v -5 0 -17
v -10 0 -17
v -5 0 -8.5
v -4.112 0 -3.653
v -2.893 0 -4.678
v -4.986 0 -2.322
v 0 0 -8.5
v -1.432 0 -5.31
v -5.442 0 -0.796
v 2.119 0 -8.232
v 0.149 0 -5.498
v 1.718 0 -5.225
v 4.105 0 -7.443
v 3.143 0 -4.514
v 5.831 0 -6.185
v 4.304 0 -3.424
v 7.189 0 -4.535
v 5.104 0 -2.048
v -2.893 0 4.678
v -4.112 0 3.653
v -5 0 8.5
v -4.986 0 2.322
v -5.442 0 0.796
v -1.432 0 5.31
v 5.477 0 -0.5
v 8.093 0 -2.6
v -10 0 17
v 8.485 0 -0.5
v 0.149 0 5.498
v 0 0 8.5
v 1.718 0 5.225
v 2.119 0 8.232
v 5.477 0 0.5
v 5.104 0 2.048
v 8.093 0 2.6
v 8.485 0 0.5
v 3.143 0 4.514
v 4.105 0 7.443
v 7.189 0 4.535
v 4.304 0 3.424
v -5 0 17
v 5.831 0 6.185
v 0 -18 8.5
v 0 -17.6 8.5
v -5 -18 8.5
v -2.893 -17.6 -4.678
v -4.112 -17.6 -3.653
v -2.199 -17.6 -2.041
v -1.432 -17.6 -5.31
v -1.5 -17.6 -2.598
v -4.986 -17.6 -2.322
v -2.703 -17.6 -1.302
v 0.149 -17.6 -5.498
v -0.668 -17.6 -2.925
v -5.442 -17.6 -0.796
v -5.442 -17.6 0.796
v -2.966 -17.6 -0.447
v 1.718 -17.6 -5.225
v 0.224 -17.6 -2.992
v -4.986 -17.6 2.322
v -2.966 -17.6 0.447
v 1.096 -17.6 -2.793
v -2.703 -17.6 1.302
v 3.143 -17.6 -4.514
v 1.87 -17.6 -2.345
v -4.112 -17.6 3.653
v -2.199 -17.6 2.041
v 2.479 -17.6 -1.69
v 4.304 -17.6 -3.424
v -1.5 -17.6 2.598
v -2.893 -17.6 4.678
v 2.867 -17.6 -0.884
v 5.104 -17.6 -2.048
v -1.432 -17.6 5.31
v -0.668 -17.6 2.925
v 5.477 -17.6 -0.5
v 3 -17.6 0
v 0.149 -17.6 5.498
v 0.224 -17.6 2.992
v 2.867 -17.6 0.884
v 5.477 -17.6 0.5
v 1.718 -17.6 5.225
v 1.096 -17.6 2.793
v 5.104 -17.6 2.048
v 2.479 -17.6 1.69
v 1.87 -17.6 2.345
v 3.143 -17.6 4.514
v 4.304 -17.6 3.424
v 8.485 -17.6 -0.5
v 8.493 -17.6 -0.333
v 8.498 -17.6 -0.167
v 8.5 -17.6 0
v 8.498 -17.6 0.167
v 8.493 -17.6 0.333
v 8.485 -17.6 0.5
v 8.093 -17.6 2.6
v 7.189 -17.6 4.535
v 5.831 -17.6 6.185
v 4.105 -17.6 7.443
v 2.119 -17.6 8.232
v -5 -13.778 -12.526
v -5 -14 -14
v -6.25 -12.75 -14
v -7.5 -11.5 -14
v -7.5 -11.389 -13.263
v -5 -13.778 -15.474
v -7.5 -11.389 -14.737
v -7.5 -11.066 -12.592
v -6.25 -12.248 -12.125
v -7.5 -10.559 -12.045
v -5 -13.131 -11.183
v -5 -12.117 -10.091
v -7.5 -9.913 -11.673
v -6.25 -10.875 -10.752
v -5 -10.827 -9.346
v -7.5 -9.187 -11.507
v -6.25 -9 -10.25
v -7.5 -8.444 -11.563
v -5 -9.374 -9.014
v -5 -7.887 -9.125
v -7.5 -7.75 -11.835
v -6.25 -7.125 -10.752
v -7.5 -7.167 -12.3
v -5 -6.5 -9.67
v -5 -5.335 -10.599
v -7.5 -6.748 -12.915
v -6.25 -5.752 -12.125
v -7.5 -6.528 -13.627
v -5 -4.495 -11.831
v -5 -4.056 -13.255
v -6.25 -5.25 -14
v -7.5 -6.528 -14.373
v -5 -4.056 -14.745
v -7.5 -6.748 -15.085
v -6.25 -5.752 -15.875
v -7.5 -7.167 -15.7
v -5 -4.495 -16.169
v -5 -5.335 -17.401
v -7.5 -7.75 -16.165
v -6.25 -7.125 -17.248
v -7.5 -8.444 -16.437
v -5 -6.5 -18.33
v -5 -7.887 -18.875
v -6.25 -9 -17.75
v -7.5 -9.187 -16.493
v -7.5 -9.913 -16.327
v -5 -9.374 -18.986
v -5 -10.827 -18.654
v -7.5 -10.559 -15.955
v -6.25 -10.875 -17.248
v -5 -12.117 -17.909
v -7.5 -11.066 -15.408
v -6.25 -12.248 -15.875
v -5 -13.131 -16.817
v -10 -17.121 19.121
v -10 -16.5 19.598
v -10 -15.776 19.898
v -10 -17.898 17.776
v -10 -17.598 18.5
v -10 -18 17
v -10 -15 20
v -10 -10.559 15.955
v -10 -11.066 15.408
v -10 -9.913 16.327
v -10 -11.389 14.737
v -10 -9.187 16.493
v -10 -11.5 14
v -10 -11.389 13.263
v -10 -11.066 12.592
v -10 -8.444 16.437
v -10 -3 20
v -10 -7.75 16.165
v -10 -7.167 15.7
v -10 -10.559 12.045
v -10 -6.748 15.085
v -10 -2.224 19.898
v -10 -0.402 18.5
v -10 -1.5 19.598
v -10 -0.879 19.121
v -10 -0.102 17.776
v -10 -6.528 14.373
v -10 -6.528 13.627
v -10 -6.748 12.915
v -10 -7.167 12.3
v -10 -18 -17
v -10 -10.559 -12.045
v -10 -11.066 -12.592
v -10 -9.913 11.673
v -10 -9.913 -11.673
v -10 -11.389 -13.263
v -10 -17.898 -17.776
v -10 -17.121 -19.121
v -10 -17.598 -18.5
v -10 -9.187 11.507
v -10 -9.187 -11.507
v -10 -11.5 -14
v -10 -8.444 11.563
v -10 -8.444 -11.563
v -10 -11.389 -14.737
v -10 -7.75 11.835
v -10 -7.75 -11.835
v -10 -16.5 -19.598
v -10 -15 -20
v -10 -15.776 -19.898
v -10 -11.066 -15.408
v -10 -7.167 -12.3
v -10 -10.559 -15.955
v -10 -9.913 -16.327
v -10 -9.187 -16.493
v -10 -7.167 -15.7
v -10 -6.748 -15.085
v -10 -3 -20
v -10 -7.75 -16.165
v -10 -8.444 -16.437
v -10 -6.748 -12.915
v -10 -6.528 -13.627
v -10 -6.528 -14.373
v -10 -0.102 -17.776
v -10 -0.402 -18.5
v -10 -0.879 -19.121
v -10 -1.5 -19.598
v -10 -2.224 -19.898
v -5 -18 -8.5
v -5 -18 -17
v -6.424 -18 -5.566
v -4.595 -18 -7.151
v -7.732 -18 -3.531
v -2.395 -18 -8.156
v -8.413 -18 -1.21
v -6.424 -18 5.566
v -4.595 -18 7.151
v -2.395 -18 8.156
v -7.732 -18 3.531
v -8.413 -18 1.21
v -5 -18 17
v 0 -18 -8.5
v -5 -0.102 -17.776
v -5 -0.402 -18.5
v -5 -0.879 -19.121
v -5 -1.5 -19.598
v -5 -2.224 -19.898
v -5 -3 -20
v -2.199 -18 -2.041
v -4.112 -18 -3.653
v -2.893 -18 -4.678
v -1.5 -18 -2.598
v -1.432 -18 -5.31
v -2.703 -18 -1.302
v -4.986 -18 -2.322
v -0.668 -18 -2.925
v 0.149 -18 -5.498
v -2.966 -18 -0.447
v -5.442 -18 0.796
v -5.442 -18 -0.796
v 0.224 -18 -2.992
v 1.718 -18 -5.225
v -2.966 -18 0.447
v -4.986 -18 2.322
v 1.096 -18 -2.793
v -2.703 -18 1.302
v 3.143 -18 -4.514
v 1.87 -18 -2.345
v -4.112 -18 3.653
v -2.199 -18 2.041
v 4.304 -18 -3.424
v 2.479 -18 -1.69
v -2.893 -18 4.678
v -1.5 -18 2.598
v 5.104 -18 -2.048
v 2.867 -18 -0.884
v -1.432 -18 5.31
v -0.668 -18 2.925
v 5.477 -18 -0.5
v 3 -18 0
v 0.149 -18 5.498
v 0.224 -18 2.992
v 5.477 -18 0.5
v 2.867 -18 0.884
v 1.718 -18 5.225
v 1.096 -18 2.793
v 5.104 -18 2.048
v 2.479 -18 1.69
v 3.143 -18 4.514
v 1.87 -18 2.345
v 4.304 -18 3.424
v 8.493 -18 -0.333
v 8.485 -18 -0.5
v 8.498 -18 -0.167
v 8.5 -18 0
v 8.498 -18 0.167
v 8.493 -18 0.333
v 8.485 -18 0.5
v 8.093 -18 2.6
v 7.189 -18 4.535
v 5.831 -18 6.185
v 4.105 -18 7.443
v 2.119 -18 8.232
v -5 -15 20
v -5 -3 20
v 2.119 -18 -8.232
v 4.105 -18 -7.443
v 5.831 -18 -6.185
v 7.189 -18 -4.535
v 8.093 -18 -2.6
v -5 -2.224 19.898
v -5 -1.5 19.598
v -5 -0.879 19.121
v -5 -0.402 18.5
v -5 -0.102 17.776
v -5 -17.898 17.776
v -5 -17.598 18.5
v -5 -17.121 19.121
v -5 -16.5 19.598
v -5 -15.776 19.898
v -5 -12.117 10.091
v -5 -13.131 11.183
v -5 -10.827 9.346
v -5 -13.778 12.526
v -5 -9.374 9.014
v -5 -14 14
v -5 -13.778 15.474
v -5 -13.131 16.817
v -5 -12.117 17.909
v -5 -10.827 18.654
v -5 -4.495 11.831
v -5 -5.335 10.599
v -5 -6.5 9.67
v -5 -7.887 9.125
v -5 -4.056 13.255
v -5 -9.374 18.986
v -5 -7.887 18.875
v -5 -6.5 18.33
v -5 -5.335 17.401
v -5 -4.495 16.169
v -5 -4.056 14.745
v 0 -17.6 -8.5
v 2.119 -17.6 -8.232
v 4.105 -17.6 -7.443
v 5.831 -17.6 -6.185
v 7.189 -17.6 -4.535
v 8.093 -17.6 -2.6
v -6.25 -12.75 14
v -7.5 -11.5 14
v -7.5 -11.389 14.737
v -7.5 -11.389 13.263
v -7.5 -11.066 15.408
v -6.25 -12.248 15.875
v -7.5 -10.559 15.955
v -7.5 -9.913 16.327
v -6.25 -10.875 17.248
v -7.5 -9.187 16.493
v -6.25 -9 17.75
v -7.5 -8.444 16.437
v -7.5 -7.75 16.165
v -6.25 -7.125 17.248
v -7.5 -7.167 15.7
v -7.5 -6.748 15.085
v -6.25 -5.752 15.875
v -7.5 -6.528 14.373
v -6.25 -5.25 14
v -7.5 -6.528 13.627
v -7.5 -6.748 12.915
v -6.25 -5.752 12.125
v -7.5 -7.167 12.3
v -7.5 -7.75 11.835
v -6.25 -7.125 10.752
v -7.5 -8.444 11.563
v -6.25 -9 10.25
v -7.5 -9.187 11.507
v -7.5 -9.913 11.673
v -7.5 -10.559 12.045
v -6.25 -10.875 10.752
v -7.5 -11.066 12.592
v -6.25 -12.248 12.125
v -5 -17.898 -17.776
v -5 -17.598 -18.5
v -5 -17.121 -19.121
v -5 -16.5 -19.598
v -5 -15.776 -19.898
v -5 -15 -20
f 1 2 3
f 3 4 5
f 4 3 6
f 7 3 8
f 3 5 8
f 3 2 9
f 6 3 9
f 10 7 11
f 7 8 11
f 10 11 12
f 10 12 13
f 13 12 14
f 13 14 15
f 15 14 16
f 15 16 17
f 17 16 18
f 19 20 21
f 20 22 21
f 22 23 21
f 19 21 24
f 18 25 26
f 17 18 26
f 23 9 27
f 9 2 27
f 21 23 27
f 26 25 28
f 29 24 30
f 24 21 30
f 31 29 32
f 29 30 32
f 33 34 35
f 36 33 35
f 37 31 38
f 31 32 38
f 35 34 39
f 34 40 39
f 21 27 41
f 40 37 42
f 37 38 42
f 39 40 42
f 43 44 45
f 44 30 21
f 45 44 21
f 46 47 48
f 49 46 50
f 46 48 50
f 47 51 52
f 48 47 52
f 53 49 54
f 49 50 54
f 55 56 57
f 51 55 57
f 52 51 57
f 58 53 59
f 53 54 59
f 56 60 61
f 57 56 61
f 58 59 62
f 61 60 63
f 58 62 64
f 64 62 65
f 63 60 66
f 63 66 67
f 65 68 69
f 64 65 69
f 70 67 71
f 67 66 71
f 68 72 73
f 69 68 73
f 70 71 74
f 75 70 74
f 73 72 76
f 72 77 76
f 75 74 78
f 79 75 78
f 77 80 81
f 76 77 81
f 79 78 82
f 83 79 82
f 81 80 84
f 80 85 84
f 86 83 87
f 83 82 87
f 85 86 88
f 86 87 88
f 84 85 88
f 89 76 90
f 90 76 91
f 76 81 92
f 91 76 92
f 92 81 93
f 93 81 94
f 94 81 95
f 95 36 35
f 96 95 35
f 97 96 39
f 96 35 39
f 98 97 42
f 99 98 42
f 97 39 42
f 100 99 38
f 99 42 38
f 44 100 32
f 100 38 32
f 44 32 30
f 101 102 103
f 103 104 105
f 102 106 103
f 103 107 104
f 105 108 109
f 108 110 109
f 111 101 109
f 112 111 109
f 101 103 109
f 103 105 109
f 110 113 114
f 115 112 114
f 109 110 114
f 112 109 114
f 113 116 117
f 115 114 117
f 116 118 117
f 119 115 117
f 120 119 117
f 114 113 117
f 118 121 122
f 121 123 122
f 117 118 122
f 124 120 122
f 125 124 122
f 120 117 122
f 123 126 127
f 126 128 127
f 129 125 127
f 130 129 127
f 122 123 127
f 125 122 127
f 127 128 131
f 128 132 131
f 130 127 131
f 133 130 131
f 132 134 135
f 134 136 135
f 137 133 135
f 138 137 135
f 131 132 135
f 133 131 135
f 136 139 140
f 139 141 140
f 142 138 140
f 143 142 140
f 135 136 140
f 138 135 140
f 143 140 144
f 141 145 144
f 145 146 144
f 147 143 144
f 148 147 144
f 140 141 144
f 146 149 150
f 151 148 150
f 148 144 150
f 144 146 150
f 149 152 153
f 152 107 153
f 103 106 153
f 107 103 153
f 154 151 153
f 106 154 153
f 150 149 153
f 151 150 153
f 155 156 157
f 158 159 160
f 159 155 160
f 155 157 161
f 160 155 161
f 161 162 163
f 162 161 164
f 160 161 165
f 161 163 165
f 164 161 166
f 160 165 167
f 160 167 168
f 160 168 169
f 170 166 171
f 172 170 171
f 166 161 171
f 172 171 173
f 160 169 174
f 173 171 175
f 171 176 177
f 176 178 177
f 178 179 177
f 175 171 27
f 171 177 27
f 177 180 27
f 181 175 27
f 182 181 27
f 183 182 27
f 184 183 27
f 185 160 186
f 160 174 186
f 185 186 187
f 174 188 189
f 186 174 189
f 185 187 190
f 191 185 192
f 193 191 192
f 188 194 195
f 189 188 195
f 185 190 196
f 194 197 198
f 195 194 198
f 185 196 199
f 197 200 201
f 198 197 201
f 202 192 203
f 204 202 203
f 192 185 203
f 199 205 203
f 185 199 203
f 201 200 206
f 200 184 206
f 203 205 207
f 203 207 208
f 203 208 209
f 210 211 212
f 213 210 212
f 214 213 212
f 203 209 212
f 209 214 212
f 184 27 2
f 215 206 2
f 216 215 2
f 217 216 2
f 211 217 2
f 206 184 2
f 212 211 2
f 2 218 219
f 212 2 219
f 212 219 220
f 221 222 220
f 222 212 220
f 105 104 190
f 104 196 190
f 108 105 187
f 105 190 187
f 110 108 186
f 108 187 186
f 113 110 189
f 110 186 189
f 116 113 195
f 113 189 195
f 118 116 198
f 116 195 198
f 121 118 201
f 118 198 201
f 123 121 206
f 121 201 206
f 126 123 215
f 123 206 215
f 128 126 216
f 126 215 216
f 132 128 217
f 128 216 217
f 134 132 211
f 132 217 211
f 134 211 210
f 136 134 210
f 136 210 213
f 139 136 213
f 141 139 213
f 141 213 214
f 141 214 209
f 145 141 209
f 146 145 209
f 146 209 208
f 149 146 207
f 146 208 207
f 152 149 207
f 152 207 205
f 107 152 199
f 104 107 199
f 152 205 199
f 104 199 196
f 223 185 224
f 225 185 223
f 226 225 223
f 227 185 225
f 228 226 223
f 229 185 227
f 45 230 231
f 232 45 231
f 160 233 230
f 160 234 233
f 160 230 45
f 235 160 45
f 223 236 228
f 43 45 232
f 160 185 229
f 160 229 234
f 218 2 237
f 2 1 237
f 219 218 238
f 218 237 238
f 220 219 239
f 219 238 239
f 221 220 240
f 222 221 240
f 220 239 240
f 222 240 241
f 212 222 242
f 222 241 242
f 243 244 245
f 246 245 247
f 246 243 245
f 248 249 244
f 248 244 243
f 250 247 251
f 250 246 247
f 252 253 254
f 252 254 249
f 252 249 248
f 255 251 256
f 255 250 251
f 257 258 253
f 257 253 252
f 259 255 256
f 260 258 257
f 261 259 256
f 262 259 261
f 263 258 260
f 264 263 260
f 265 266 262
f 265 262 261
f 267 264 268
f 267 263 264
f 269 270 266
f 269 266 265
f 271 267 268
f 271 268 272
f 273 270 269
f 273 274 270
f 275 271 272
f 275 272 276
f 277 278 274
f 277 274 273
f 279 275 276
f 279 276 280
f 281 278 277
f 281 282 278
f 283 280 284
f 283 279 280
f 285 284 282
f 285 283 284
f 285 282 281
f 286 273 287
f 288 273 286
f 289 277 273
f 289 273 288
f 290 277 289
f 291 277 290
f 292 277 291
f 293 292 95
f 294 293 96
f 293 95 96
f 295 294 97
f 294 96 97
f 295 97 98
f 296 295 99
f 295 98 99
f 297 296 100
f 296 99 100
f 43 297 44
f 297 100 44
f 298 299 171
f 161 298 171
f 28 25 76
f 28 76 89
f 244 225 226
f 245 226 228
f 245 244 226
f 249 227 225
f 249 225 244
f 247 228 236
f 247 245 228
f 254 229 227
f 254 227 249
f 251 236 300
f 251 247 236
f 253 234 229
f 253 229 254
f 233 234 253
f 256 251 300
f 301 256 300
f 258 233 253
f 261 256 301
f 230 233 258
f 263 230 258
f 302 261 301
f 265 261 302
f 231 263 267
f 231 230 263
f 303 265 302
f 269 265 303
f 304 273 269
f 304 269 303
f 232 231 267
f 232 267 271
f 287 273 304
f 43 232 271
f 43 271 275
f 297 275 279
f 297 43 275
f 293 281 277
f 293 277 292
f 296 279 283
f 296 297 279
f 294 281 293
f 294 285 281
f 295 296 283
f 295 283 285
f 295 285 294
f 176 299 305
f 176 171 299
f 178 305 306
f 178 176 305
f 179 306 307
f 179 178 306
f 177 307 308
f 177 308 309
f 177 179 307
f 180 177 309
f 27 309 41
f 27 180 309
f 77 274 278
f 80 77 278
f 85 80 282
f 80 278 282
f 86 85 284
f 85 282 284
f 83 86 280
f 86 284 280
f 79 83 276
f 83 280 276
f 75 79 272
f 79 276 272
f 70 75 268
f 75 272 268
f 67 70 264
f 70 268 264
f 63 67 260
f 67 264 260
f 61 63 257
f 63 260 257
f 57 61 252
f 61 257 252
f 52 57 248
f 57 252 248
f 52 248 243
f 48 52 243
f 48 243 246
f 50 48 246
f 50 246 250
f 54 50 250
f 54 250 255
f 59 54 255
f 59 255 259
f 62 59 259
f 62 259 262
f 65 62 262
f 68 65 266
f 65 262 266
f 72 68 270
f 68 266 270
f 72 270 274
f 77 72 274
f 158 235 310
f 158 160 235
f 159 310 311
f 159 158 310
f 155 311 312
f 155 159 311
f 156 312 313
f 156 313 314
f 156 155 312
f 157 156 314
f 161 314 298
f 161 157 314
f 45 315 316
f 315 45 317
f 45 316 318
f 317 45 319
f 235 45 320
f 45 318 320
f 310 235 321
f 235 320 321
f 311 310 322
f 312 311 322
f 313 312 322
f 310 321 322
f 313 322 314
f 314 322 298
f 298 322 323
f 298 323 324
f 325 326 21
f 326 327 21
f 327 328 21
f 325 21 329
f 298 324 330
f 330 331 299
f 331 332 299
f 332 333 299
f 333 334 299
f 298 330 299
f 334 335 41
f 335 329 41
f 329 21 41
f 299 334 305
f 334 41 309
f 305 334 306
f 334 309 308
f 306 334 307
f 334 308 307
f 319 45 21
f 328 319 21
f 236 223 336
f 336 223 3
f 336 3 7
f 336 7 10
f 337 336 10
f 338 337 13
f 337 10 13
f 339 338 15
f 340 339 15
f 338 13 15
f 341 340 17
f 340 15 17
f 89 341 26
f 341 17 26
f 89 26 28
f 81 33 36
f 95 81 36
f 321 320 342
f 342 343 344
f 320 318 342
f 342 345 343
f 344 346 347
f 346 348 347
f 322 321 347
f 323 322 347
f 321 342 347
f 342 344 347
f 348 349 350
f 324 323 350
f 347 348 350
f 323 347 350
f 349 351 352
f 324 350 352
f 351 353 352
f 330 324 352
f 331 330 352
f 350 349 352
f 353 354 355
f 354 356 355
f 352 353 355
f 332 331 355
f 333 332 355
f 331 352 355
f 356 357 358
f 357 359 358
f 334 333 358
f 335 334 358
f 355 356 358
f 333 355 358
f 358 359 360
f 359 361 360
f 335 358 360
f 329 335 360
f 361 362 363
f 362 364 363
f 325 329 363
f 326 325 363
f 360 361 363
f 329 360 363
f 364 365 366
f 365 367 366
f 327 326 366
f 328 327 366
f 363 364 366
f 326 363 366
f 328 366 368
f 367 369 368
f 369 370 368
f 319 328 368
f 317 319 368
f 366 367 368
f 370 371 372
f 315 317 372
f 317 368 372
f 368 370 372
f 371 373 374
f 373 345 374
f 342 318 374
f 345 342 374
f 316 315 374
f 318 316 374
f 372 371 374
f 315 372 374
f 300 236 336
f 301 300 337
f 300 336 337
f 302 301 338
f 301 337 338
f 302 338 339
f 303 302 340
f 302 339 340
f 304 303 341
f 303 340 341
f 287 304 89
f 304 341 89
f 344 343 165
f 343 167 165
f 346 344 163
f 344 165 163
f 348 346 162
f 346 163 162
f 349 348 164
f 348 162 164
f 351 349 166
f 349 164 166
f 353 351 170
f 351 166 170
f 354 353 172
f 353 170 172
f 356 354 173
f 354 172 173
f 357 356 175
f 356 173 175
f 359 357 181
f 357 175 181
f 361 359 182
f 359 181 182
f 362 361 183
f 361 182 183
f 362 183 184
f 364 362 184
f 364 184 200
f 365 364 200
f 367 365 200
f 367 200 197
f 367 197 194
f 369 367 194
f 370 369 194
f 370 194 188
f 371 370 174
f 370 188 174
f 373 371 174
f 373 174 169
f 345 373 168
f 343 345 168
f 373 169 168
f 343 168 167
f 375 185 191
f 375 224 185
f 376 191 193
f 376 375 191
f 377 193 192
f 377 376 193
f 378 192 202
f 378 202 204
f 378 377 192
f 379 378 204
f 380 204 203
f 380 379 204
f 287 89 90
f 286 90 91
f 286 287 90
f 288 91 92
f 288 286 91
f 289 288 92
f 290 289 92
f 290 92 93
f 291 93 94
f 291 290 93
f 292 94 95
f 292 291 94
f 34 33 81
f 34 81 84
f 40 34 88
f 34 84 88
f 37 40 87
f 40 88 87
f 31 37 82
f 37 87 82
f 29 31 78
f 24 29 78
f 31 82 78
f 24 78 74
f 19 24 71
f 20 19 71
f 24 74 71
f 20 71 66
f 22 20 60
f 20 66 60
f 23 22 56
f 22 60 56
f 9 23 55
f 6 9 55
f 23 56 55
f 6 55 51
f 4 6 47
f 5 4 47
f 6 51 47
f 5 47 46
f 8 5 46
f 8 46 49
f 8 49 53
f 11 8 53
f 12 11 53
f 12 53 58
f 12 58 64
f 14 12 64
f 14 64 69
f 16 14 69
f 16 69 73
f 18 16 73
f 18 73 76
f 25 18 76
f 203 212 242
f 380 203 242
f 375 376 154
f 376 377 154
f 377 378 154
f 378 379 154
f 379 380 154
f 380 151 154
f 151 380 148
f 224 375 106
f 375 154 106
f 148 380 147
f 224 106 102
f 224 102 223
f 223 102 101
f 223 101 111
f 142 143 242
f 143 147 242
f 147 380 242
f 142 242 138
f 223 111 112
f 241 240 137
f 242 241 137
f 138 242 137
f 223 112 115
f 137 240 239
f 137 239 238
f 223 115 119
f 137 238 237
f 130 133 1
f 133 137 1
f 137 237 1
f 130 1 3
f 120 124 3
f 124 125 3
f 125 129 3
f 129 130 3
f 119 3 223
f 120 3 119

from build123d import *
from build123d import SkipClean  # not in build123d's __all__

# Parameters (mm, degrees)
F1_DEPTH       = 18
F2_R           = 5.5
F3_DEPTH       = 18
F5_D           = 5
F5_CSINK_D     = 10
F5_CSINK_ANGLE = 90
F6_W           = 7.3579490118
F6_H           = 1
F7_DEPTH       = 18
F8_R           = 3
F9_R           = 8.5
F9_R_2         = 3
F10_DEPTH      = 0.4


with BuildPart() as f1:
    # F0 (on Front) → F1 (new body)
    with BuildSketch(Plane.XZ):
        with BuildLine():
            ThreePointArc((-5, -6.8738635424), (-8.5, 0), (-5, 6.8738635424))
            Line((-5, 6.8738635424), (-5, 8.5))
            Line((-5, 8.5), (-5, 20))
            Line((-5, 20), (-10, 20))
            Line((-10, 20), (-10, -20))
            Line((-10, -20), (-5, -20))
            Line((-5, -20), (-5, -8.5))
            Line((-5, -8.5), (-5, -6.8738635424))
        make_face()
        with BuildLine():
            ThreePointArc((0, -8.5), (6.0104076401, -6.0104076401), (8.5, 0))
            ThreePointArc((8.5, 0), (6.0104076401, 6.0104076401), (0, 8.5))
            ThreePointArc((0, 8.5), (-2.6288932927, 8.0832493501), (-5, 6.8738635424))
            Line((-5, 6.8738635424), (-5, -6.8738635424))
            ThreePointArc((-5, -6.8738635424), (-2.6288932927, -8.0832493501), (0, -8.5))
        make_face()
        with BuildLine():
            Line((-5, -8.5), (0, -8.5))
            ThreePointArc((0, -8.5), (-2.6288932927, -8.0832493501), (-5, -6.8738635424))
            Line((-5, -6.8738635424), (-5, -8.5))
        make_face()
        with BuildLine():
            Line((-5, -6.8738635424), (-5, 6.8738635424))
            ThreePointArc((-5, 6.8738635424), (-8.5, 0), (-5, -6.8738635424))
        make_face()
        with BuildLine():
            ThreePointArc((-5, 6.8738635424), (-2.6288932927, 8.0832493501), (0, 8.5))
            Line((0, 8.5), (-5, 8.5))
            Line((-5, 8.5), (-5, 6.8738635424))
        make_face()
    extrude(amount=F1_DEPTH)

    # F2 (on face) → F3 (cut, through all)
    with BuildSketch(Plane.XZ.offset(18)):
        Circle(F2_R)
    extrude(amount=-F3_DEPTH, mode=Mode.SUBTRACT)

    # F5 (through all)
    with Locations(Plane.YZ.offset(-5)):
        with Locations((-9, -14), (-9, 14)):
            CounterSinkHole(F5_D / 2, F5_CSINK_D / 2, counter_sink_angle=F5_CSINK_ANGLE)

    # F6 (on Front) → F7 (cut, through all)
    with BuildSketch(Plane.XZ):
        with Locations((7.1057528257, 0)):
            Rectangle(F6_W, F6_H)
    extrude(amount=F7_DEPTH, mode=Mode.SUBTRACT)

    # F8
    f8_edges = [f1.edges().sort_by_distance(p)[0] for p in [
        (-7.5, -18, -20),
        (-7.5, -18, 20),
        (-7.5, 0, 20),
        (-7.5, 0, -20),
    ]]
    fillet(f8_edges, radius=F8_R)

    # F9 (on face) → F10 (join)
    with BuildSketch(Plane.XZ.offset(18)):
        Circle(F9_R)
        Circle(F9_R_2, mode=Mode.SUBTRACT)
    with SkipClean():  # cleaning this boolean's faces spoils the solid; the shape is the same uncleaned
        extrude(amount=-F10_DEPTH)


solid = f1.part
